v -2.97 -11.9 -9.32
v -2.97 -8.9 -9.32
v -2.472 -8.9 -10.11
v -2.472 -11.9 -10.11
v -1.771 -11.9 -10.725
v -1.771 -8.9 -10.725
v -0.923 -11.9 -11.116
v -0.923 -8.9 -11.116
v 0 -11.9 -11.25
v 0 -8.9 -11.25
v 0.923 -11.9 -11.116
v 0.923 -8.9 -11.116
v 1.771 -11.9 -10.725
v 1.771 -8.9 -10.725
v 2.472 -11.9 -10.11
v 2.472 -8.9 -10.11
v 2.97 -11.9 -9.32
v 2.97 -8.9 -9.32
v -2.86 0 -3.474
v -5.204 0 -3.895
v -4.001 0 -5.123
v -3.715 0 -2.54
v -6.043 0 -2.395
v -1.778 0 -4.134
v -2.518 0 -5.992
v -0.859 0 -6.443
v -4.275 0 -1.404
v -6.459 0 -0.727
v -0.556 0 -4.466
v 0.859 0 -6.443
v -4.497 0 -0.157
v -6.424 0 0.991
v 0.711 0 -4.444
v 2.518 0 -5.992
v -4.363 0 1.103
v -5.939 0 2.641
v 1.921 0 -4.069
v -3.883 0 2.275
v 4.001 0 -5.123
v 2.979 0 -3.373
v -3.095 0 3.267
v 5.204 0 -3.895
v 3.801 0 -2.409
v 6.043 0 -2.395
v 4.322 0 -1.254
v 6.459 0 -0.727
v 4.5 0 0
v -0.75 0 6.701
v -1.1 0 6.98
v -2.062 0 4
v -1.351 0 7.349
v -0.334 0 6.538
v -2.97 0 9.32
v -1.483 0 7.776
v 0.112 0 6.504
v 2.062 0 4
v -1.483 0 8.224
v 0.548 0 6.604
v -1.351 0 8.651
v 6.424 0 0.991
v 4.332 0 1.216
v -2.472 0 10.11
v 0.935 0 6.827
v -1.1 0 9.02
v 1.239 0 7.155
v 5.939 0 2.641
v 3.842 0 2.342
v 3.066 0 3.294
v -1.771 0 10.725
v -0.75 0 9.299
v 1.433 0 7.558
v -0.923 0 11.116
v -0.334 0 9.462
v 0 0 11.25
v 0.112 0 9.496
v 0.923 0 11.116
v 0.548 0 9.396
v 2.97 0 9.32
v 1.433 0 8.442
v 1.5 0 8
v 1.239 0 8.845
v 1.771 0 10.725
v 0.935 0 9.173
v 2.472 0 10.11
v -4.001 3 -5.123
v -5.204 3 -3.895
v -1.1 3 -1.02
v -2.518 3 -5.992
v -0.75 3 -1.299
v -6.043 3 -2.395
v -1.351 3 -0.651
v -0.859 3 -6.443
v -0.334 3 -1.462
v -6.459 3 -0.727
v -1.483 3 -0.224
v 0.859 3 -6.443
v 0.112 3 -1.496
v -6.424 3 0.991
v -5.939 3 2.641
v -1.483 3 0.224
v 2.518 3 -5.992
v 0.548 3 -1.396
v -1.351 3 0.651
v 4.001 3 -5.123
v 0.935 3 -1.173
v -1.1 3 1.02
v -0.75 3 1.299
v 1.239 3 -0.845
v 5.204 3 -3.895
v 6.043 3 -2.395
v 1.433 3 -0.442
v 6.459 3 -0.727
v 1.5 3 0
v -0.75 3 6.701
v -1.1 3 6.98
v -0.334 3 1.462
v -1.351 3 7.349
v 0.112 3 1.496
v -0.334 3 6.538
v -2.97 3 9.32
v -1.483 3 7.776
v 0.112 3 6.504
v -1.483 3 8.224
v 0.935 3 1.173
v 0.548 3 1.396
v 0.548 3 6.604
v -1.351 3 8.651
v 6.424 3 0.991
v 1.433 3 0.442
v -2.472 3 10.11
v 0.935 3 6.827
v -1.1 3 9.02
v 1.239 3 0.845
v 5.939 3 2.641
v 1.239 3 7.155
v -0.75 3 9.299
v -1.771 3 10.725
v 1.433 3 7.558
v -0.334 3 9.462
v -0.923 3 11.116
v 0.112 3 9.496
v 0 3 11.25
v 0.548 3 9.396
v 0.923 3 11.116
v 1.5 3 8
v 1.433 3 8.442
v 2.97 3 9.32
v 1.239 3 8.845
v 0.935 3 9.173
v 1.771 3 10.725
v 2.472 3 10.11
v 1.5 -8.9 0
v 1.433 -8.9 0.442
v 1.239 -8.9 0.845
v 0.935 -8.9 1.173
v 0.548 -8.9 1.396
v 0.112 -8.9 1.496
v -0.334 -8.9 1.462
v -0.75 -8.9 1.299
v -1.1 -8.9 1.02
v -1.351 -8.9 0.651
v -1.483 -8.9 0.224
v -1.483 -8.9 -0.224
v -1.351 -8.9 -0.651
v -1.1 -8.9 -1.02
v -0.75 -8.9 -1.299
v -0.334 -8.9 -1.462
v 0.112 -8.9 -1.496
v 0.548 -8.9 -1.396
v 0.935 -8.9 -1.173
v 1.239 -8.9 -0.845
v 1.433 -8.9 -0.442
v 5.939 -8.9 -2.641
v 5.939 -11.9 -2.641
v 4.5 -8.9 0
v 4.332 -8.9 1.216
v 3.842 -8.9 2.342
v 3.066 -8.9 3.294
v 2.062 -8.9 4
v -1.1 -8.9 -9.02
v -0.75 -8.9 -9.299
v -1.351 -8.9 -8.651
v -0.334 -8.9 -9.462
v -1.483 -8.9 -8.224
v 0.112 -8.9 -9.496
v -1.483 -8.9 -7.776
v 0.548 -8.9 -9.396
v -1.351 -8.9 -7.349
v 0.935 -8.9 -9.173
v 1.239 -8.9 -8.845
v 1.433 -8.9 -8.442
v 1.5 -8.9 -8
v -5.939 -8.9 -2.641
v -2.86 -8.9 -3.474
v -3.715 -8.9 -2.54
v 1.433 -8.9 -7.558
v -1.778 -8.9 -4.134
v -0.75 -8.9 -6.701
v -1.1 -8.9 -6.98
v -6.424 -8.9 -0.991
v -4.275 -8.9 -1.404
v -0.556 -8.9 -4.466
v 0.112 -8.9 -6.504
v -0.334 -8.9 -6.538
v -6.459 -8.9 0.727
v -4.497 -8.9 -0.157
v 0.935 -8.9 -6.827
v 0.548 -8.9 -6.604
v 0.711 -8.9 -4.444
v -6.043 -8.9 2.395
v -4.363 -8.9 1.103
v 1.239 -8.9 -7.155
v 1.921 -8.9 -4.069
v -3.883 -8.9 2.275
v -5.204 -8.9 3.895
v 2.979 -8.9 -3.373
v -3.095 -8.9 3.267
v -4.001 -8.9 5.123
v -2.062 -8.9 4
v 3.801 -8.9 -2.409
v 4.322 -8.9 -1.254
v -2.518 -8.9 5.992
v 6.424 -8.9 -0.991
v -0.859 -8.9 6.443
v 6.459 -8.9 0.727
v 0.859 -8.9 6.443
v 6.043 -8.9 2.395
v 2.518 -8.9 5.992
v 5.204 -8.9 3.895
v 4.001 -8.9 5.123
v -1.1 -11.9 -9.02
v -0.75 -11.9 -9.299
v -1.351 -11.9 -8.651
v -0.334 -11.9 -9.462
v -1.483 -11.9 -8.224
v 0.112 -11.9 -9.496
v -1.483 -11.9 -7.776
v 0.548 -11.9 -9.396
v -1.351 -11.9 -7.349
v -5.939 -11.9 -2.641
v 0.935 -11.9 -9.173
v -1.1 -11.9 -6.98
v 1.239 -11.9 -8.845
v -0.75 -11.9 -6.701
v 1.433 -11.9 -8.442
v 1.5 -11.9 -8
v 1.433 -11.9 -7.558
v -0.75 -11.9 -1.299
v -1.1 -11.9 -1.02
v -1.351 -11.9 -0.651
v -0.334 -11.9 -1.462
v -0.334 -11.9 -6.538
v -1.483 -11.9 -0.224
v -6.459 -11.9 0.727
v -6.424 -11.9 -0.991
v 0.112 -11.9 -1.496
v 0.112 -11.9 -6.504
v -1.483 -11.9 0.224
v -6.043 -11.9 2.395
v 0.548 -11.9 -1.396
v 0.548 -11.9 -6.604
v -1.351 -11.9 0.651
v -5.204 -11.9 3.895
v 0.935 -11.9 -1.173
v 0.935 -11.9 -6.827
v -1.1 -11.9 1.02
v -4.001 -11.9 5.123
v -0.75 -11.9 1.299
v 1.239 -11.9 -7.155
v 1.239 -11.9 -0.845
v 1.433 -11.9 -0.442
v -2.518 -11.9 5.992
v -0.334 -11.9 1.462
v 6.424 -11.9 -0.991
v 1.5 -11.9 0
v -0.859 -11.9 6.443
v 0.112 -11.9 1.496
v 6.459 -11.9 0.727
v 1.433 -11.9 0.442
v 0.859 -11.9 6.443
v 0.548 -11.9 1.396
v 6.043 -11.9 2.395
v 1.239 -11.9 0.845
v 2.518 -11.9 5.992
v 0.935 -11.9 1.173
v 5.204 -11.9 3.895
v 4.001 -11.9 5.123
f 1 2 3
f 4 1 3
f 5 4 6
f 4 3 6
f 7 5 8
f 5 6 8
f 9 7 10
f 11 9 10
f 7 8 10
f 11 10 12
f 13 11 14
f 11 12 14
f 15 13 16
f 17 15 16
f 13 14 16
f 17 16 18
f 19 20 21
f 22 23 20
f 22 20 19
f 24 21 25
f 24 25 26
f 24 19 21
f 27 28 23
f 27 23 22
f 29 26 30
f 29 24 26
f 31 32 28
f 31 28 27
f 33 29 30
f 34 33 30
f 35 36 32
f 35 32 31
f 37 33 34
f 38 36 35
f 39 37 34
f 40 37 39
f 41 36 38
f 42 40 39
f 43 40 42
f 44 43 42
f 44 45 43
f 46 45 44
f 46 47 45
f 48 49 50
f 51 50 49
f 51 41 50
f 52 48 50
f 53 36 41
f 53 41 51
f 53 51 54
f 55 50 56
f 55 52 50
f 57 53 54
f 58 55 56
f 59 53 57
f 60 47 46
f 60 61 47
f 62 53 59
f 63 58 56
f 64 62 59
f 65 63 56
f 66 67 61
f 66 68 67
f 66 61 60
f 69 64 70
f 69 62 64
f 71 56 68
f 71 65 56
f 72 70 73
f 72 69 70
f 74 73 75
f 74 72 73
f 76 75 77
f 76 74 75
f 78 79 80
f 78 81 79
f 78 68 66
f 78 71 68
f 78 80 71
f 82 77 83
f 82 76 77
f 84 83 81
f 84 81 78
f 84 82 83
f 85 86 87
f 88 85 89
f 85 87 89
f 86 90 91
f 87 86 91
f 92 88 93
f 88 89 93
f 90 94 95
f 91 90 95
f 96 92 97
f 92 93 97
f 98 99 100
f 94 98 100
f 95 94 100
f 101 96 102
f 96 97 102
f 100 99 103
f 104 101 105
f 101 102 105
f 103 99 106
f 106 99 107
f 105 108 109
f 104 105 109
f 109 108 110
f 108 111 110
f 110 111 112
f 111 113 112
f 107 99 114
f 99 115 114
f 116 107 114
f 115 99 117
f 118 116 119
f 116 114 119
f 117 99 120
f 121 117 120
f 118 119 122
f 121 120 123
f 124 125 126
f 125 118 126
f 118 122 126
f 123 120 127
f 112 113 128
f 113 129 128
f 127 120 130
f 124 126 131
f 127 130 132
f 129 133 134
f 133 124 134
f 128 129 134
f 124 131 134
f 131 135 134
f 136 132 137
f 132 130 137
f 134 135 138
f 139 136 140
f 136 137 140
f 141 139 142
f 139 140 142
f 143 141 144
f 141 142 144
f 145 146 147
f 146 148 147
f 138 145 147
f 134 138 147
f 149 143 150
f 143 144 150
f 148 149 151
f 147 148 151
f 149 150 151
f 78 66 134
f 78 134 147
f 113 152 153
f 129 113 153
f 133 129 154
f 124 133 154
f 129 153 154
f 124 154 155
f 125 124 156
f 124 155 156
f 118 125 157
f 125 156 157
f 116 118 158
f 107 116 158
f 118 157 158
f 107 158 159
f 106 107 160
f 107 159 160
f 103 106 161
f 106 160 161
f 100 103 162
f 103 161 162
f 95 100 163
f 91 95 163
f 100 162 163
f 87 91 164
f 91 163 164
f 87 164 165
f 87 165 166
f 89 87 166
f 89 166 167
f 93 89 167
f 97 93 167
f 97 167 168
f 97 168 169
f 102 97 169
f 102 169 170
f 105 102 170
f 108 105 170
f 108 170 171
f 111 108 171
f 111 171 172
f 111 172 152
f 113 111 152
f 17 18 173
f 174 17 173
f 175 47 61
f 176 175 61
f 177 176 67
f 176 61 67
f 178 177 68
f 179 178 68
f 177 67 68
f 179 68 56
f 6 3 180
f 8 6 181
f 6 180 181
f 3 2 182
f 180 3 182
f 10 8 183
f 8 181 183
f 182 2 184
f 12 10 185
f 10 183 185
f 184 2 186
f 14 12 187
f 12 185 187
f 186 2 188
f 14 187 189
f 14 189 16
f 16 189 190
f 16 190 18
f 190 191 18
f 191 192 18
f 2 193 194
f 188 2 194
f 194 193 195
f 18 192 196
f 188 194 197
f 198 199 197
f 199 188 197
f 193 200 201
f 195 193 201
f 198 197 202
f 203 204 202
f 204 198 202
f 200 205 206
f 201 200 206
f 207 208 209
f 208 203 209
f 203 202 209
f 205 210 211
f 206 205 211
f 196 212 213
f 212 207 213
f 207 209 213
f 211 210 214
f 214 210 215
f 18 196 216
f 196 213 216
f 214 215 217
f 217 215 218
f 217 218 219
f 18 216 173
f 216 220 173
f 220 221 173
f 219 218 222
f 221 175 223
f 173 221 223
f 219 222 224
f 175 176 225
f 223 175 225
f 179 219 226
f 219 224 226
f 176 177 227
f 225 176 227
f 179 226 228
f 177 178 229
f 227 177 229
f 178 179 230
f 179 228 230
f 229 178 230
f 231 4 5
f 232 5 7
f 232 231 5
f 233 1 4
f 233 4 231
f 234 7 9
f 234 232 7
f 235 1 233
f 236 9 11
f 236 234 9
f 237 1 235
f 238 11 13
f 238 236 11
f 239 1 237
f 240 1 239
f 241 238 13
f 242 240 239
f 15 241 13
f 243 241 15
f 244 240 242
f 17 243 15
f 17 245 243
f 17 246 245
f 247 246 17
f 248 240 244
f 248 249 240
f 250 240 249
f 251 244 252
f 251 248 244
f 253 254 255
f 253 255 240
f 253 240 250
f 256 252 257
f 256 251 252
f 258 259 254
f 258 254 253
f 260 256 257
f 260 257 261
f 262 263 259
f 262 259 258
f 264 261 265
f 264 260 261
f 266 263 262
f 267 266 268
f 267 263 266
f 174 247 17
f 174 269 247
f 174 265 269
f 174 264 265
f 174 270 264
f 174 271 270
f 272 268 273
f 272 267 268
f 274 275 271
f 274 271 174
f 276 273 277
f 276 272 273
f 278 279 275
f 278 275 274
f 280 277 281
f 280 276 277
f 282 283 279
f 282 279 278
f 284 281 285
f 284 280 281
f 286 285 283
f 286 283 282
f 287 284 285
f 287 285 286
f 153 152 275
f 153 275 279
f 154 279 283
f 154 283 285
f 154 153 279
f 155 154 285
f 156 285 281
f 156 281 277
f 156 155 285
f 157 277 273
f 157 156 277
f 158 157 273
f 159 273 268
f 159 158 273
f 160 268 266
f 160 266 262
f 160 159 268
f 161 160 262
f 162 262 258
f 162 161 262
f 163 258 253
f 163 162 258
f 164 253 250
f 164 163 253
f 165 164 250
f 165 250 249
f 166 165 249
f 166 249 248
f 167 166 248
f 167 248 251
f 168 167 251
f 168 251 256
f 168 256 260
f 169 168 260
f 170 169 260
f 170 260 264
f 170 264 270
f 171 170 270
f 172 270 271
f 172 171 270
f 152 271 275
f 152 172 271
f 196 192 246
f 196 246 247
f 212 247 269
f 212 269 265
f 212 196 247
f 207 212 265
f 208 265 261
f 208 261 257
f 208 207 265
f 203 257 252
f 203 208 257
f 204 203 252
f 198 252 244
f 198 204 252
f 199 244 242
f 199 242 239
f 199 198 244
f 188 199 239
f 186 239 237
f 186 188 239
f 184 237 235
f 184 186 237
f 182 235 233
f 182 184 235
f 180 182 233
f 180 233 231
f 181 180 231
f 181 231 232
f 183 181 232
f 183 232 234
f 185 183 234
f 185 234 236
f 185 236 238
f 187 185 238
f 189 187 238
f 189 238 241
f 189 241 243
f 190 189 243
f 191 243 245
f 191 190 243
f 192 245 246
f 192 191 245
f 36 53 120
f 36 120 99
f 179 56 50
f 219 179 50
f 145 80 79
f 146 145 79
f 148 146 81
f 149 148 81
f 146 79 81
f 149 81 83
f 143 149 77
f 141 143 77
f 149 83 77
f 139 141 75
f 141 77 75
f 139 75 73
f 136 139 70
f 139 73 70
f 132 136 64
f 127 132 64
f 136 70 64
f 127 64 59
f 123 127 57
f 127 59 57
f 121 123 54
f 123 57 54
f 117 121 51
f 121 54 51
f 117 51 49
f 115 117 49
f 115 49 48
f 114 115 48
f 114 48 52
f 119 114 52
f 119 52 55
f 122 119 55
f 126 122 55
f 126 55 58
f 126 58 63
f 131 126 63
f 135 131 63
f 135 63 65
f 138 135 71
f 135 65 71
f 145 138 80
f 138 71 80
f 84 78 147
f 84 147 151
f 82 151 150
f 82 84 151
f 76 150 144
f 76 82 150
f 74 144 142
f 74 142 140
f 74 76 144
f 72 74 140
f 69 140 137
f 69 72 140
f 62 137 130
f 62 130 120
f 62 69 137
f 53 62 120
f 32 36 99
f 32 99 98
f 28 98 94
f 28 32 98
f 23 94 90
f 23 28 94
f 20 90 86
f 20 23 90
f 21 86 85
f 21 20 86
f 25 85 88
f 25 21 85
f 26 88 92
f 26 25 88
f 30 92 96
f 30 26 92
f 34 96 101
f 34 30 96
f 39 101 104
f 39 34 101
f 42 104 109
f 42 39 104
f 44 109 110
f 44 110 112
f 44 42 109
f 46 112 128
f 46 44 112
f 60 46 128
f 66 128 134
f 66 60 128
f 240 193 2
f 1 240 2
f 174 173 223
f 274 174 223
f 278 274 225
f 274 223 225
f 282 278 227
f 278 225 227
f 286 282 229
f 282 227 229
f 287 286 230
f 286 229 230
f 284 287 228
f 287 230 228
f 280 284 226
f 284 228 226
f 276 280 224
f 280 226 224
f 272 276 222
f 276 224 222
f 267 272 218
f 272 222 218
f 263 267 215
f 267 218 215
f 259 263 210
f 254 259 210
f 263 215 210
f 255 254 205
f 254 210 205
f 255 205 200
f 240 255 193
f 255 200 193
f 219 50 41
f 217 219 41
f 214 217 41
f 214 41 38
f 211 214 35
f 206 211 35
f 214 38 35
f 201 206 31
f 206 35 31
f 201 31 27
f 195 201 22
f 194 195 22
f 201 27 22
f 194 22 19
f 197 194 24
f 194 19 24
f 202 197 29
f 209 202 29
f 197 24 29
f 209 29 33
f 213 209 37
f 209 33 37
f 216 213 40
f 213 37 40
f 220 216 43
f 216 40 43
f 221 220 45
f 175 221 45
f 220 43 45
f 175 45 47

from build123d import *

# Parameters (mm, degrees)
F0_R     = 1.5
F1_DEPTH = 3
F3_DEPTH = 8.9
F4_R     = 1.5
F5_DEPTH = 20
F6_R     = 1.5
F7_DEPTH = 3


with BuildPart() as f1:
    # F0 (on Front) → F1 (new body)
    with BuildSketch(Plane.XZ):
        with BuildLine():
            Line((5.9394528039, 2.640625), (2.9697264019, 9.3203125))
            ThreePointArc((2.9697264019, 9.3203125), (0, 11.25), (-2.9697264019, 9.3203125))
            Line((-2.9697264019, 9.3203125), (-5.9394528039, 2.640625))
            ThreePointArc((-5.9394528039, 2.640625), (0, -6.5), (5.9394528039, 2.640625))
        make_face()
        with Locations((0, 8)):
            Circle(F0_R, mode=Mode.SUBTRACT)
    extrude(amount=-F1_DEPTH)

    # F2 (on face) → F3 (join)
    with BuildSketch(Plane.XZ):
        with BuildLine():
            ThreePointArc((-2.0615528128, 4), (-2.3423292192, -3.8423292192), (4.5, 0))
            ThreePointArc((4.5, 0), (3.8423292192, 2.3423292192), (2.0615528128, 4))
            Line((2.0615528128, 4), (-2.0615528128, 4))
        make_face()
    extrude(amount=F3_DEPTH)

    # F4 (on face) → F5 (cut)
    with BuildSketch(Plane.XZ.offset(8.9)):
        Circle(F4_R)
    extrude(amount=-F5_DEPTH, mode=Mode.SUBTRACT)

    # F6 (on face) → F7 (join)
    with BuildSketch(Plane.XZ.offset(8.9)):
        with BuildLine():
            Line((-5.9394528039, -2.640625), (-2.9697264019, -9.3203125))
            ThreePointArc((-2.9697264019, -9.3203125), (0, -11.25), (2.9697264019, -9.3203125))
            Line((2.9697264019, -9.3203125), (5.9394528039, -2.640625))
            ThreePointArc((5.9394528039, -2.640625), (0, 6.5), (-5.9394528039, -2.640625))
        make_face()
        with Locations((0, -8)):
            Circle(F6_R, mode=Mode.SUBTRACT)
        with BuildLine():
            Line((-2.0615528128, 4), (2.0615528128, 4))
            ThreePointArc((2.0615528128, 4), (3.8423292192, 2.3423292192), (4.5, 0))
            ThreePointArc((4.5, 0), (-2.3423292192, -3.8423292192), (-2.0615528128, 4))
        make_face(mode=Mode.SUBTRACT)
        with BuildLine():
            ThreePointArc((4.5, 0), (3.8423292192, 2.3423292192), (2.0615528128, 4))
            Line((2.0615528128, 4), (-2.0615528128, 4))
            ThreePointArc((-2.0615528128, 4), (-2.3423292192, -3.8423292192), (4.5, 0))
        make_face()
        Circle(F6_R, mode=Mode.SUBTRACT)
    extrude(amount=F7_DEPTH)


solid = f1.part
